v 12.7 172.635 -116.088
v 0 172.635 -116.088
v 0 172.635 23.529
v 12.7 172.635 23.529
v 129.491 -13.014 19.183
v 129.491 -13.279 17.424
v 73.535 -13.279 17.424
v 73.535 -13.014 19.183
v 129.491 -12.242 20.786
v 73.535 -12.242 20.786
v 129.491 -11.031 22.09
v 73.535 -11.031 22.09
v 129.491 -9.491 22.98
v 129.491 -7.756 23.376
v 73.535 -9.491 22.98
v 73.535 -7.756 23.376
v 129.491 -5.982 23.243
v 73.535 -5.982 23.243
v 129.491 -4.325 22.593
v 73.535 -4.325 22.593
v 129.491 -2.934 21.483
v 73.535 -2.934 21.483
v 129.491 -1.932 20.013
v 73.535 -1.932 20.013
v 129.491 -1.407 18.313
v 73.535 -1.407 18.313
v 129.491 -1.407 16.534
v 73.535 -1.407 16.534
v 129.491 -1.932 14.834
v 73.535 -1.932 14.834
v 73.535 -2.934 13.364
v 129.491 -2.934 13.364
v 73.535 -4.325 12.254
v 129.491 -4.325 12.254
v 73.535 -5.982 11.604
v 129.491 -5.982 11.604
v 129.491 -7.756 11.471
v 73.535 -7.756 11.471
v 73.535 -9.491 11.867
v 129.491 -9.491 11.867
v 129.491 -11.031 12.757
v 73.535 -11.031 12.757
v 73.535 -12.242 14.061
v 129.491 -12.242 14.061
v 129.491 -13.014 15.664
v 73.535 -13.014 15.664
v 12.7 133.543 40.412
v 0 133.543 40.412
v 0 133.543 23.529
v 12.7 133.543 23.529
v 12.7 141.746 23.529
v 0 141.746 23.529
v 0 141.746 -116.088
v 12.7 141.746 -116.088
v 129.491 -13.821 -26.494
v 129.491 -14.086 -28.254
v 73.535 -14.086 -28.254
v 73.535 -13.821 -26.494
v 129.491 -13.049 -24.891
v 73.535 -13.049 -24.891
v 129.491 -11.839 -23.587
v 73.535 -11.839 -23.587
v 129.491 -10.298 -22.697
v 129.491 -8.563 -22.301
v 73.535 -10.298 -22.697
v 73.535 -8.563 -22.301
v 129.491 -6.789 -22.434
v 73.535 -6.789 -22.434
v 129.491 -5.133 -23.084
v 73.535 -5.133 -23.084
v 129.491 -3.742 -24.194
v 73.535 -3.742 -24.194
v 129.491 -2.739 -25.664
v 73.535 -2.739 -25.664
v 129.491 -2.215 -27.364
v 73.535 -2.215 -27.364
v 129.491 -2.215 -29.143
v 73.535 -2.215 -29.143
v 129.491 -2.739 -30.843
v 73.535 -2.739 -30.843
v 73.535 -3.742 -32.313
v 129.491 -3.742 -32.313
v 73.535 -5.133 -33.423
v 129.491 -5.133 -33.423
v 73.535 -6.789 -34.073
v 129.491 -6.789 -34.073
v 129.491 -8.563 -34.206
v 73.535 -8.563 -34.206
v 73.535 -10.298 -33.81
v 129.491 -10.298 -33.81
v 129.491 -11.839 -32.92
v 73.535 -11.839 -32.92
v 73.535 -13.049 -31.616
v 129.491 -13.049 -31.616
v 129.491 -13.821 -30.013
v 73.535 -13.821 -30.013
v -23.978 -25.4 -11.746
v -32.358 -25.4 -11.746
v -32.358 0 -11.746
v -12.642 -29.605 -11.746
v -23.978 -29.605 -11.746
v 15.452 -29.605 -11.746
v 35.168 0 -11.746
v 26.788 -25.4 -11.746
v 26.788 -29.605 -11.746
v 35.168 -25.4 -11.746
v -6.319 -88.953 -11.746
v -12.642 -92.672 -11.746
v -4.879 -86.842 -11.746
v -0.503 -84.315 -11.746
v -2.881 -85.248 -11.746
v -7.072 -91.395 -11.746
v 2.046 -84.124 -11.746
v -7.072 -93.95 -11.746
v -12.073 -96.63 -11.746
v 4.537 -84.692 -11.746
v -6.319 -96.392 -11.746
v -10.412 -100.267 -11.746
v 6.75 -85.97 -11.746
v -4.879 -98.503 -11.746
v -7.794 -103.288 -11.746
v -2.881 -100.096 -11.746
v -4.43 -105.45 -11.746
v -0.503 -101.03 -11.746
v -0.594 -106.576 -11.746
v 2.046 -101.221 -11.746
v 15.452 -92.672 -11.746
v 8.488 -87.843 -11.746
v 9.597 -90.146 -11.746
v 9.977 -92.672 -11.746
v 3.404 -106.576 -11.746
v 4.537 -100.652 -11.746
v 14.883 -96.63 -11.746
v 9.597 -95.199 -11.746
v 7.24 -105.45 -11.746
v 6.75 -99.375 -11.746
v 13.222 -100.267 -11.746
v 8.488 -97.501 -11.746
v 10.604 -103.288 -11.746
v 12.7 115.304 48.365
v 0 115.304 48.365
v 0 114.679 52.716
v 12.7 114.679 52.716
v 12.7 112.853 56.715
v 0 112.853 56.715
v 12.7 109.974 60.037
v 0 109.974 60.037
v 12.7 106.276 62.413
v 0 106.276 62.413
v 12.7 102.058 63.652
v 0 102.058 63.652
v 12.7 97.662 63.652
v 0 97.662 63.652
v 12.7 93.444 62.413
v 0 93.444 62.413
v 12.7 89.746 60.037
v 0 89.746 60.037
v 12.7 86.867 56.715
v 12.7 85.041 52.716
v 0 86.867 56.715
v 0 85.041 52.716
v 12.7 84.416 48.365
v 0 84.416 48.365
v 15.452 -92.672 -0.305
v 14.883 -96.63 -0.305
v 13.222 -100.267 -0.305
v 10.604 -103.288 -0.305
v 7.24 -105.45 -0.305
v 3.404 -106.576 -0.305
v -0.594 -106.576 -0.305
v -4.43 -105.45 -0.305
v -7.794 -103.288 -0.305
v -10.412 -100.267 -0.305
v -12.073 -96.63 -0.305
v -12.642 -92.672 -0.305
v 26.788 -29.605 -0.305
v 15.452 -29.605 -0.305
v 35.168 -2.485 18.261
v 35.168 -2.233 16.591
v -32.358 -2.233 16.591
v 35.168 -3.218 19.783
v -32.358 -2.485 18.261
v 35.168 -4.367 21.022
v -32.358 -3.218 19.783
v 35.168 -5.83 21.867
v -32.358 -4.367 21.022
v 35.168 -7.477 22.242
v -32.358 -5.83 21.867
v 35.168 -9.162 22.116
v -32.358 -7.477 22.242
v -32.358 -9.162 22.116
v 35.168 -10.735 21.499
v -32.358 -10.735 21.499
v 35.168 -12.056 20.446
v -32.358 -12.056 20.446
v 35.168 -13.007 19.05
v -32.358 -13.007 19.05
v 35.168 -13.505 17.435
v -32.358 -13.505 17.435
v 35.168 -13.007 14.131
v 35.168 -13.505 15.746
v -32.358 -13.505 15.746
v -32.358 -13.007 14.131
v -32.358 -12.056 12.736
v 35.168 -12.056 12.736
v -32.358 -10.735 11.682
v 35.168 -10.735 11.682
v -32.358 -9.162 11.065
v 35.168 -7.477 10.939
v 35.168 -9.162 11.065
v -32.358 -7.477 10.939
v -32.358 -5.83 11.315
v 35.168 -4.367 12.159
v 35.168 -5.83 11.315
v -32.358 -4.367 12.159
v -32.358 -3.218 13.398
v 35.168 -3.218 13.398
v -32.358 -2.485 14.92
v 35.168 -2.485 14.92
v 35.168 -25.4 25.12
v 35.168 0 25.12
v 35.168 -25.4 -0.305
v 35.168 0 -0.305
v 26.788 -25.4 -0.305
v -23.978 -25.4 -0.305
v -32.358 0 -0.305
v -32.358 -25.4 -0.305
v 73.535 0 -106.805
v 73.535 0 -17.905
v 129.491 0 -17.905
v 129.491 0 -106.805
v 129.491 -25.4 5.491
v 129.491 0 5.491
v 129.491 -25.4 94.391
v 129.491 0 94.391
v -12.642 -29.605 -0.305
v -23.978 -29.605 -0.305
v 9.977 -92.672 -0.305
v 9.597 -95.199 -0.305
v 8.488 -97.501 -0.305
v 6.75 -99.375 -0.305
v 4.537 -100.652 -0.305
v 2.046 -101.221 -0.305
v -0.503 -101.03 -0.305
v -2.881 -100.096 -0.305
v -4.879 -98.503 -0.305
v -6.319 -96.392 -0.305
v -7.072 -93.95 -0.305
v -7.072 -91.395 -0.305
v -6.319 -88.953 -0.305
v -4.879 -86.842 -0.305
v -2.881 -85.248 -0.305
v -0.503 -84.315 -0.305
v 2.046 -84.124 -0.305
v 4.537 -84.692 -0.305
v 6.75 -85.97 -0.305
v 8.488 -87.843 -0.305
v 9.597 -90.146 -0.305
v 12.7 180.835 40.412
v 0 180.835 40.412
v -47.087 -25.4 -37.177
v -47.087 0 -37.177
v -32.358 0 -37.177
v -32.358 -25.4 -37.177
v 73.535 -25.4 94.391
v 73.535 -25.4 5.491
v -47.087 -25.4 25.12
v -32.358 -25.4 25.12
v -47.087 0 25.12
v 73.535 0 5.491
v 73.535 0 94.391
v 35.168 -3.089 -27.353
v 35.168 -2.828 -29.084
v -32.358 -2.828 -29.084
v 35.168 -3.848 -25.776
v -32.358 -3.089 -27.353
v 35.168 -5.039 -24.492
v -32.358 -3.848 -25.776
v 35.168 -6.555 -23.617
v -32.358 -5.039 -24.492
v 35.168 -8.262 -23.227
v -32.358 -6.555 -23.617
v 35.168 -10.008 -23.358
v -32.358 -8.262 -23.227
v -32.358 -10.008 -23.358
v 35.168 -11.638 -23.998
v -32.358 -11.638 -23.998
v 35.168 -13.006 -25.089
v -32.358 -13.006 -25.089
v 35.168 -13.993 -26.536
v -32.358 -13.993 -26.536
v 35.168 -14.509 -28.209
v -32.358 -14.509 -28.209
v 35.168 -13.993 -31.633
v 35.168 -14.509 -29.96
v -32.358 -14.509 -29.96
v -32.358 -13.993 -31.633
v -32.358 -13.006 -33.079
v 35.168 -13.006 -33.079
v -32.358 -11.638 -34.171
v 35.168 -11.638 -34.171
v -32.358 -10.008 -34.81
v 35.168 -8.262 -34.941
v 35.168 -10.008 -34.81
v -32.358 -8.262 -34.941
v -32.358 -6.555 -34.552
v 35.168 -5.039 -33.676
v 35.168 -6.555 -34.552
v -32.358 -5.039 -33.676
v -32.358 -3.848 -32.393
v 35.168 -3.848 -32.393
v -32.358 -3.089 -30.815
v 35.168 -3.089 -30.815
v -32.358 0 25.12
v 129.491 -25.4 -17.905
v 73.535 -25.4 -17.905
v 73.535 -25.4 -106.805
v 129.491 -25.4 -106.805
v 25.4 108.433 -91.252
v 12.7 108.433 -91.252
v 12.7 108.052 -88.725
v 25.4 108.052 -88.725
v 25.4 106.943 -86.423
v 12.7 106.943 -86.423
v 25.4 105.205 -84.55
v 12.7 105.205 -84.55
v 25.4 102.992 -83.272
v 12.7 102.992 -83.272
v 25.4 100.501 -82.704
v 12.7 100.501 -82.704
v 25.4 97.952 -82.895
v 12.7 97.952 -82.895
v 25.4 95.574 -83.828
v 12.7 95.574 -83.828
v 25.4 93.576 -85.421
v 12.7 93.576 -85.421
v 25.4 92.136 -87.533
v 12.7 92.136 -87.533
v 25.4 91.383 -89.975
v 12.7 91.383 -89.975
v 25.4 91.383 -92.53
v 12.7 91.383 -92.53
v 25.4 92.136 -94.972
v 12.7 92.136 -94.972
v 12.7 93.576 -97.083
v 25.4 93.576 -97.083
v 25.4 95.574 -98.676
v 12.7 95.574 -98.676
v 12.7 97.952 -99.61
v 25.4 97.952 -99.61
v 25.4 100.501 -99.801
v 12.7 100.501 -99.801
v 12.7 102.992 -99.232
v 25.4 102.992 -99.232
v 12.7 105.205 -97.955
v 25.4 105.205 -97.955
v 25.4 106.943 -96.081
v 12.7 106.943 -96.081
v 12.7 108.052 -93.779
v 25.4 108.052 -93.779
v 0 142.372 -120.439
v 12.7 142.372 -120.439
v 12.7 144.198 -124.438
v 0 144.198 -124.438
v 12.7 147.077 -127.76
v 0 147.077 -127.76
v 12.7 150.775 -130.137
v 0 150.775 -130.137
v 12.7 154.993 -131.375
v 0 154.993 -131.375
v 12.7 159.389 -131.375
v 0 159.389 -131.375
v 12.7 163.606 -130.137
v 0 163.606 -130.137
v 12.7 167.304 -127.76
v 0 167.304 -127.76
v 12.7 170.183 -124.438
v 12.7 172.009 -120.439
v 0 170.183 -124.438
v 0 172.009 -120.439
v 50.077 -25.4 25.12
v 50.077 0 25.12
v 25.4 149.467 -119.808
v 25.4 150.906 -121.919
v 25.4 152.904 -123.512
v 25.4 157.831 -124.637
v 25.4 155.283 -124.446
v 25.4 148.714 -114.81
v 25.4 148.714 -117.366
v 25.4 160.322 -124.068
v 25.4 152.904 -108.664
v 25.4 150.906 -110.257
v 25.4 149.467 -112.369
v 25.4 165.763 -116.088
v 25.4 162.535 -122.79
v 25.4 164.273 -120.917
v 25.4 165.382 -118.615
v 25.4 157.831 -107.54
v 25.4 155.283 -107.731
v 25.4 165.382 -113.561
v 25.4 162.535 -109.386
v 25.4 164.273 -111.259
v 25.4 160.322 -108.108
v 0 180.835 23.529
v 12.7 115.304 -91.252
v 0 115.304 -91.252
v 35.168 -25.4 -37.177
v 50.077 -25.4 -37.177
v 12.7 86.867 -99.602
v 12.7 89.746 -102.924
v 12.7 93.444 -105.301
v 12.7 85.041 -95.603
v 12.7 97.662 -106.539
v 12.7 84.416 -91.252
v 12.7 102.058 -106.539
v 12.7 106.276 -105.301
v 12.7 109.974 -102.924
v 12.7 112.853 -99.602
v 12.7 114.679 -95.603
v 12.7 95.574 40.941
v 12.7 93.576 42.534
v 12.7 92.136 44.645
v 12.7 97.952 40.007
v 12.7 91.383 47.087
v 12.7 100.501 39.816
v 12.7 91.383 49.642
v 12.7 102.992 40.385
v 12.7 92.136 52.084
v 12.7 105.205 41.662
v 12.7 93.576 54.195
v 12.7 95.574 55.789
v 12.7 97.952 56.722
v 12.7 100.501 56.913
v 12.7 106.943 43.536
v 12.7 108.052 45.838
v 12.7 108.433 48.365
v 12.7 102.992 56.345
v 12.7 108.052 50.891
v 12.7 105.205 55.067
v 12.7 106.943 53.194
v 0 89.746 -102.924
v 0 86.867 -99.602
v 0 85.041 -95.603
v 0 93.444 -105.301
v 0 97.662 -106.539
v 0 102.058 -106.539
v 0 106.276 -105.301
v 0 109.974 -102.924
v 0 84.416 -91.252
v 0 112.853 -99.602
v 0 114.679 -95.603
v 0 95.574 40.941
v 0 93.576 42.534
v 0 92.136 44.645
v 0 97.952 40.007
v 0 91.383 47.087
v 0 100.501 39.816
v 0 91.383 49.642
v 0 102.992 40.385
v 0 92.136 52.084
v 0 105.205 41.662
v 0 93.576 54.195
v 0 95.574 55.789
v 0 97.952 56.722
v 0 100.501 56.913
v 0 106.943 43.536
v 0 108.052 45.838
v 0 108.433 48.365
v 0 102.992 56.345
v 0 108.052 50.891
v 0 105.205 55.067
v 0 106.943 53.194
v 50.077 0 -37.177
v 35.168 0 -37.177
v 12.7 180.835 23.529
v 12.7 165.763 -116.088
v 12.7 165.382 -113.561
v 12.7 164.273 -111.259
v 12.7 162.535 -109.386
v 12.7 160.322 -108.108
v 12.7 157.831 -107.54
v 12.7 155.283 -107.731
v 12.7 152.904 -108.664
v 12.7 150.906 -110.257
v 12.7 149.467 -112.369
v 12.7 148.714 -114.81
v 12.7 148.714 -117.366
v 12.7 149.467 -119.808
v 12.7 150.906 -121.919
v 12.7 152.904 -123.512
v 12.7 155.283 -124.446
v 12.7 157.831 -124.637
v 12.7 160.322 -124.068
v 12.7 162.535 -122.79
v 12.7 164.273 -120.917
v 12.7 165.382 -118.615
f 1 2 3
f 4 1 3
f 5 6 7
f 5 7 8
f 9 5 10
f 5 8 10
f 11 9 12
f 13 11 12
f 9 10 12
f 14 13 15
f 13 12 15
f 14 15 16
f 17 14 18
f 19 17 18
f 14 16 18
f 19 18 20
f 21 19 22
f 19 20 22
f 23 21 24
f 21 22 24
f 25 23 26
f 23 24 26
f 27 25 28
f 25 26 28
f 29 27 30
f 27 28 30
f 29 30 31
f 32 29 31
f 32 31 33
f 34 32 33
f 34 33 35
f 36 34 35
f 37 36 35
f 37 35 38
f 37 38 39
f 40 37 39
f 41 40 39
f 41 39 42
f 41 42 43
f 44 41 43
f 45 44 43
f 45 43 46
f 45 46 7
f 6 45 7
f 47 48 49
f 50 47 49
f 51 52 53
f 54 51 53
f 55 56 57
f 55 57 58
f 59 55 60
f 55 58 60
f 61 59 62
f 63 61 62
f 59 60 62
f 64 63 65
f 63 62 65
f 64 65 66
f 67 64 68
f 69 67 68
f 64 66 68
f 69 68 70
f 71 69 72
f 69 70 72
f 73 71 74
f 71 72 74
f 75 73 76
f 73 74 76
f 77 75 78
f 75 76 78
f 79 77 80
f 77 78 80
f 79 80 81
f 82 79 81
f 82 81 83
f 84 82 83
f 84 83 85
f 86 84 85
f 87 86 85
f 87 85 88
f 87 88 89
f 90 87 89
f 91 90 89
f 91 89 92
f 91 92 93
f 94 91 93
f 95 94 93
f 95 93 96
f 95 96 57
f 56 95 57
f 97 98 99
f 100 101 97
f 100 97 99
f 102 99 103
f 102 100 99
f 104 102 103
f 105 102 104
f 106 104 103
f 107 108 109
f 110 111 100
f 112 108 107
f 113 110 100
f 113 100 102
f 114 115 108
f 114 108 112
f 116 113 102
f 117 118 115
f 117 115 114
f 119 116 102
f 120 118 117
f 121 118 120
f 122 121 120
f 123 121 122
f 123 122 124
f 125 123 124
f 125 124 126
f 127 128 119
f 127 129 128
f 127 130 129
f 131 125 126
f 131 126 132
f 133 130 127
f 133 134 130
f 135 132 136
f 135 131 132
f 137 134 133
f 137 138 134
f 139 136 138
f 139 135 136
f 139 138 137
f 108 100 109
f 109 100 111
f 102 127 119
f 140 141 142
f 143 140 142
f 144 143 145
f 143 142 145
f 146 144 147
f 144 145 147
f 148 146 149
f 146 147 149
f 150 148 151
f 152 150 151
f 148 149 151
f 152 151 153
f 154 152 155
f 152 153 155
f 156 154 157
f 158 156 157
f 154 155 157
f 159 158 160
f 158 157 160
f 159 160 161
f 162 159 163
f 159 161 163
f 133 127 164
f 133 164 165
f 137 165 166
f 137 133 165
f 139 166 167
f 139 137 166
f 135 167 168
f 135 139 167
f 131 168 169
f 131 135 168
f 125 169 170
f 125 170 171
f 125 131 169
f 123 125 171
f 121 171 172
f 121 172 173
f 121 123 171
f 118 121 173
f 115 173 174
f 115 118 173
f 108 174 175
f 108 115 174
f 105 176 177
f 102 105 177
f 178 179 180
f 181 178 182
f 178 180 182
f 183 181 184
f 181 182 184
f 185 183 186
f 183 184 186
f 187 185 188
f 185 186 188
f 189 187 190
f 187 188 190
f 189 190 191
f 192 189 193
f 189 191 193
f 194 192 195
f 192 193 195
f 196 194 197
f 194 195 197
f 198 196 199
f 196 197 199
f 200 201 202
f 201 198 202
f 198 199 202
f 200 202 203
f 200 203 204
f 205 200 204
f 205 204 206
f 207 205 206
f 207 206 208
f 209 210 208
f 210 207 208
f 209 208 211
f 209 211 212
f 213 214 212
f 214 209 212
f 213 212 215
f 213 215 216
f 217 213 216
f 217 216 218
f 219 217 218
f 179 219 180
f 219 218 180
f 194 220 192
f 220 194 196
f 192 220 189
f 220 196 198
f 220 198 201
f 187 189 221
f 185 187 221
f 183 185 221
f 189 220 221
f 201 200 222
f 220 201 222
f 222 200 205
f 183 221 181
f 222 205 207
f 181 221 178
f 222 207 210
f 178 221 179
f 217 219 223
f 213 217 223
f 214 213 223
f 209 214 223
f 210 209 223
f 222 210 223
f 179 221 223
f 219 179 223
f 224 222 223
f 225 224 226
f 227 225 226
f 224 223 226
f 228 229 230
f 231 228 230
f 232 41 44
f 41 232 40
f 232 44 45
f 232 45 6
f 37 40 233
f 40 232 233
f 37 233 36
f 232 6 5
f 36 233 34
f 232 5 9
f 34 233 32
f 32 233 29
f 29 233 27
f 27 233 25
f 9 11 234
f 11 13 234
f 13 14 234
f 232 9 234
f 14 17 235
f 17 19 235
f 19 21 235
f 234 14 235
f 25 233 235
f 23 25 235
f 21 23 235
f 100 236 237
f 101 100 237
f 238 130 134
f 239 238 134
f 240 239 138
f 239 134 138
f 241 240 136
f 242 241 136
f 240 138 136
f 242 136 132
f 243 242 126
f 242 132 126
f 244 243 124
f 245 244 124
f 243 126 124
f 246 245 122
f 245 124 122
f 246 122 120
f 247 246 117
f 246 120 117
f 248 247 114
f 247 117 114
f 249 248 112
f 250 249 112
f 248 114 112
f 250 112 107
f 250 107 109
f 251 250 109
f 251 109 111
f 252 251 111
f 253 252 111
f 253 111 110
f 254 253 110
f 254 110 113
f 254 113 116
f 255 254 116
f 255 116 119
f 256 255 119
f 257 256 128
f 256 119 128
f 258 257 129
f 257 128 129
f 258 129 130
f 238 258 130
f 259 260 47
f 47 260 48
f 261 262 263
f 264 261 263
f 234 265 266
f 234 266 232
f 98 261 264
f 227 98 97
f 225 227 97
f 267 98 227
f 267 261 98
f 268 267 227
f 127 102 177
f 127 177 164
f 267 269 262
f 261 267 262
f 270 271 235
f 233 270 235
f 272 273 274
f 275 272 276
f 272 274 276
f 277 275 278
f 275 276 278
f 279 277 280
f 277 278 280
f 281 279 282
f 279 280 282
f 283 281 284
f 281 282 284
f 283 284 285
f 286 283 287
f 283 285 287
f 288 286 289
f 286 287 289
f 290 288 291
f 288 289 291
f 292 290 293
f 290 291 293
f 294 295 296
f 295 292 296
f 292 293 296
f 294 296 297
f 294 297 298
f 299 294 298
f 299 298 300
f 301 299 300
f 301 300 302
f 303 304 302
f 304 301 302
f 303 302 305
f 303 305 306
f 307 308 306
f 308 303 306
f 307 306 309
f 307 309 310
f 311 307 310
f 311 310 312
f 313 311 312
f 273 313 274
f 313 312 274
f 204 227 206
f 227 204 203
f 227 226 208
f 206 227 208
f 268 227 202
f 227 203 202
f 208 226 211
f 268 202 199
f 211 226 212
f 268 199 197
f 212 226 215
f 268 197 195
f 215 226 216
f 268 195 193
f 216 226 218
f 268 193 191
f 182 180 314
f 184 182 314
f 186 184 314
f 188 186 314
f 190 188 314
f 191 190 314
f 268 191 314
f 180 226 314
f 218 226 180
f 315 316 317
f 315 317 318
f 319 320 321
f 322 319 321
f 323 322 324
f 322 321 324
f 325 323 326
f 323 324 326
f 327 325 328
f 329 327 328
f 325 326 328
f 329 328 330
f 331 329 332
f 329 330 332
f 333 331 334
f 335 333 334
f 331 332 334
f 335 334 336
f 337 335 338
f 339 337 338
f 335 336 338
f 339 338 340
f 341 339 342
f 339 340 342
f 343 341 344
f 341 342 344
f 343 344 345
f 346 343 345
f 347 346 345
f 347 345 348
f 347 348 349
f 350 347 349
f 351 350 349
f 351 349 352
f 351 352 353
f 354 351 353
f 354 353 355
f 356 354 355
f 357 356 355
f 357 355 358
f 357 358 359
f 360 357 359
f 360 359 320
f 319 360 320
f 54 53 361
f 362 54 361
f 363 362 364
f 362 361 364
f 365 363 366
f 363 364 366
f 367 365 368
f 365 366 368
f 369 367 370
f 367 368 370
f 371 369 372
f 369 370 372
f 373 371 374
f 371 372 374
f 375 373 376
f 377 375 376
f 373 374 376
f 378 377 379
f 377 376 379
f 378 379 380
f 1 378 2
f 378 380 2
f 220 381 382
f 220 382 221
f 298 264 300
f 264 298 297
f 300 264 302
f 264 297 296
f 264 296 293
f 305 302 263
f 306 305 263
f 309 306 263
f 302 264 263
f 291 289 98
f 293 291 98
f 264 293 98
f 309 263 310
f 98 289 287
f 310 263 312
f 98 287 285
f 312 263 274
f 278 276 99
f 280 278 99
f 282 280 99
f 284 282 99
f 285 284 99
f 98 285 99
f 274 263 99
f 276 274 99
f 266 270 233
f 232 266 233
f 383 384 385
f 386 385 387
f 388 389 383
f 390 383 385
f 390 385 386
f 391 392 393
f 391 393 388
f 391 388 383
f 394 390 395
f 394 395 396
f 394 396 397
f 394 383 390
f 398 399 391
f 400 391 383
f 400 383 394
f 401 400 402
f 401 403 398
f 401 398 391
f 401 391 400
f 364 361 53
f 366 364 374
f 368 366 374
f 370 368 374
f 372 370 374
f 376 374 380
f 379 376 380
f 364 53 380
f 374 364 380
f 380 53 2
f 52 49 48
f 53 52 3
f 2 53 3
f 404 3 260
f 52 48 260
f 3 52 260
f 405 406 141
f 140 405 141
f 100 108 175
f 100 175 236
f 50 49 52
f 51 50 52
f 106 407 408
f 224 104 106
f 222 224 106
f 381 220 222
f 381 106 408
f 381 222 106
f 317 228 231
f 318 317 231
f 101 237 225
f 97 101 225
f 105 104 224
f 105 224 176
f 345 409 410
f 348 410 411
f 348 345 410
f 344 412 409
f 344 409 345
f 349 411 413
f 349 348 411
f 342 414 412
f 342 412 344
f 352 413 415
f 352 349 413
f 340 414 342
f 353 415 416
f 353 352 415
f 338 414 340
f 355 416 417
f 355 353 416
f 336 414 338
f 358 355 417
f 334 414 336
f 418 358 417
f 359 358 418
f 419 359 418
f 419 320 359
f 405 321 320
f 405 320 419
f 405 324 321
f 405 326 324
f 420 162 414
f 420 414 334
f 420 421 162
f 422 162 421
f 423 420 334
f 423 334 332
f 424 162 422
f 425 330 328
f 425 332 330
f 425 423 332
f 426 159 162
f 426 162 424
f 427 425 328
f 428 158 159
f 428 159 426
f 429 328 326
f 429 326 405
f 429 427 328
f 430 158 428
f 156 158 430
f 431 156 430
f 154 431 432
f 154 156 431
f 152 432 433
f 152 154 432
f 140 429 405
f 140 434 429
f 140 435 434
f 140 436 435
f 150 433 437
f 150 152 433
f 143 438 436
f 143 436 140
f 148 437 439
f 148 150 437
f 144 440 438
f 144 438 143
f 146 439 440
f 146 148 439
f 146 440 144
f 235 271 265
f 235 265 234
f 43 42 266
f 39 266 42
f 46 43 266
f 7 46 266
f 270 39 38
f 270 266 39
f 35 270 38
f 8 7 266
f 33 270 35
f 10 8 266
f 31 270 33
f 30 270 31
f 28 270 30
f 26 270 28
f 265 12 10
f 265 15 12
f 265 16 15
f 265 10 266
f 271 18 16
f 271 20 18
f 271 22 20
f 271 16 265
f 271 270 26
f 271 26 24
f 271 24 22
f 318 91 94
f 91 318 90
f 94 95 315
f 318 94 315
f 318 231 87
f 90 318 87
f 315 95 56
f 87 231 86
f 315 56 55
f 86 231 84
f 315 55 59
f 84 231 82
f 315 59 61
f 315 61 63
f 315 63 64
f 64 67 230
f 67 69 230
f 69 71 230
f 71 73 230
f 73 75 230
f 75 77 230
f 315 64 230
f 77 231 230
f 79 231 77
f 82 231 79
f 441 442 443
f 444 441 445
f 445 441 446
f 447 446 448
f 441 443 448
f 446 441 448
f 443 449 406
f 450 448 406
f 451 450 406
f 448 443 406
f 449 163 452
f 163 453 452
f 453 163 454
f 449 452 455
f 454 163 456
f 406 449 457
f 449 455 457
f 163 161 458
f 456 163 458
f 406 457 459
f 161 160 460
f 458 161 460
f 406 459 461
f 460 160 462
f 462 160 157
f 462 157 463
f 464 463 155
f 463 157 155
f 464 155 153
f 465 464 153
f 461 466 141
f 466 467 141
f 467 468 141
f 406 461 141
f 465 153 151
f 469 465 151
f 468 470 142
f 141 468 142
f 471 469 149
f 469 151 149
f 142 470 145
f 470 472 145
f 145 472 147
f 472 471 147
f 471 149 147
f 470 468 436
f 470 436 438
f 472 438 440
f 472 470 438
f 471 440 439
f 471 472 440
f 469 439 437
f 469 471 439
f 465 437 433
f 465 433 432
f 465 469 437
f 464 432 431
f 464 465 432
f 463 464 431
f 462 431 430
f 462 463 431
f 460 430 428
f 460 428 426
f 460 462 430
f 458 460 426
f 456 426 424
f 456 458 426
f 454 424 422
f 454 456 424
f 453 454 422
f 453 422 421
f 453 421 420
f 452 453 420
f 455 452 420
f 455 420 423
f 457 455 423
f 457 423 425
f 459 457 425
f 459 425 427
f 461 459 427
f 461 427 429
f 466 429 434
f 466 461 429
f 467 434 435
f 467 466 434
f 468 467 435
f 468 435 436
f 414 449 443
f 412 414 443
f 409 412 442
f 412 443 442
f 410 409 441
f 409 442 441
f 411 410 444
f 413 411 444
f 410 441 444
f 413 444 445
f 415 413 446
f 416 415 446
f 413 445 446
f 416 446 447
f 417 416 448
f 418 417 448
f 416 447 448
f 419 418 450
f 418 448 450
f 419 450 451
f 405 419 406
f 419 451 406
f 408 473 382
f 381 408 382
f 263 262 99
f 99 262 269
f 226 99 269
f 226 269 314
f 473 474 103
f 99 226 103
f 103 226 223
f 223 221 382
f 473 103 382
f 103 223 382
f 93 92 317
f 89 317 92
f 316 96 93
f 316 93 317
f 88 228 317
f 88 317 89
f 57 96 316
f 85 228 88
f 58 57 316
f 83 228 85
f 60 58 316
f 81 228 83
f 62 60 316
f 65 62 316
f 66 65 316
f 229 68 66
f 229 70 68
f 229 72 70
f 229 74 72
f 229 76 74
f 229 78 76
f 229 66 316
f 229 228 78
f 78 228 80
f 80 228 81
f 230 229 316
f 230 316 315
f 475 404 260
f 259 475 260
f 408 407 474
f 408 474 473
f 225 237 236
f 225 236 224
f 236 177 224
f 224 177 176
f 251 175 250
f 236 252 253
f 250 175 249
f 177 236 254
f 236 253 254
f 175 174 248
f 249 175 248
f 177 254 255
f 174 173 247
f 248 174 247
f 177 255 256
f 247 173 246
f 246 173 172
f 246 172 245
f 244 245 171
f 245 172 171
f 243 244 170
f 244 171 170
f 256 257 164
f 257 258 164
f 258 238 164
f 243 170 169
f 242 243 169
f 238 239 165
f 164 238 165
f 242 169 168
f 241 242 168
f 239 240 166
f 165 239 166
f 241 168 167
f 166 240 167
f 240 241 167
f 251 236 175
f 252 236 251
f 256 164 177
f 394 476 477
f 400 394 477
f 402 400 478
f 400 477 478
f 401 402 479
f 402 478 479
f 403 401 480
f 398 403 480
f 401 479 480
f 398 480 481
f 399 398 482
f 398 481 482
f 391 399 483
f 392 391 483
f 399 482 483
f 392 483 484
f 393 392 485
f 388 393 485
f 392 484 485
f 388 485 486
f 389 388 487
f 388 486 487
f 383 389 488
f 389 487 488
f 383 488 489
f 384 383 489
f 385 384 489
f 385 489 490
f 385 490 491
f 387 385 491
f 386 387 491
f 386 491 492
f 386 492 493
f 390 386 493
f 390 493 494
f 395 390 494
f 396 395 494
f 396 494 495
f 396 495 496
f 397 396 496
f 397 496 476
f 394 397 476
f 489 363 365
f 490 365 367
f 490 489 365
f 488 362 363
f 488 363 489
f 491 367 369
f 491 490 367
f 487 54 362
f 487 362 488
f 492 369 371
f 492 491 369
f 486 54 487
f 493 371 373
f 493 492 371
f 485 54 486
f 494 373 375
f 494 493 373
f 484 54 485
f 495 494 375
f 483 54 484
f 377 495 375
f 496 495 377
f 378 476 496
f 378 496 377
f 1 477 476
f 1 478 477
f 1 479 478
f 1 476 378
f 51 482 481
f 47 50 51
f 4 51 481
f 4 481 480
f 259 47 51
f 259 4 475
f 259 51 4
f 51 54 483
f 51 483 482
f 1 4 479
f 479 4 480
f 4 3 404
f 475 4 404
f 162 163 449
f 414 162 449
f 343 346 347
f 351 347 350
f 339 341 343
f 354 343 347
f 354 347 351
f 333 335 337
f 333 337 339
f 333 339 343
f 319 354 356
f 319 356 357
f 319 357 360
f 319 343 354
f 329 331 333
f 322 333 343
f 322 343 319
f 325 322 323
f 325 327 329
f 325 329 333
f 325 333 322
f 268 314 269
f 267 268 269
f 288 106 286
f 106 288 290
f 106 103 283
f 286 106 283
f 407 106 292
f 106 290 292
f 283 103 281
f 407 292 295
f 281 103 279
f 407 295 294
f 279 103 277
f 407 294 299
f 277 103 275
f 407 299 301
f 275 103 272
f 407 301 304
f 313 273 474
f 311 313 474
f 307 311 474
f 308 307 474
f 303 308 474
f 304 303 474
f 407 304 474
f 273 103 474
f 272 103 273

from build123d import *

# Parameters (mm, degrees)
F1_DEPTH  = 25.4
F2_R      = 8.5725
F3_DEPTH  = 12.7
F4_DEPTH  = 25.4
F5_R      = 8.5725
F6_DEPTH  = 11.440287
F0_W      = 55.9562
F0_H      = 88.9
F7_DEPTH  = 25.4
F10_D     = 11.938
F10_DEPTH = 76.2
F8_R      = 5.667763
F8_R_2    = 5.87329
F11_DEPTH = 76.2


with BuildPart() as f1:
    # F0 (on Front) → F1 (new body)
    with BuildSketch(Plane.XZ):
        Polygon((-32.358131, 25.119715), (-47.087183, 25.119715), (-47.087183, -37.176999), (-32.358131, -37.176999), (-32.358131, -11.745678), (35.168068, -11.745678), (35.168068, -37.176999), (50.077325, -37.176999), (50.077325, 25.119715), (35.168068, 25.119715), (35.168068, -0.305422), (-32.358131, -0.305422), align=None)
    extrude(amount=F1_DEPTH)

    # F5 (on face) → F6 (join)
    with BuildSketch(Plane(origin=(0, 0, -11.745678), x_dir=(1, 0, 0), z_dir=(0, 0, -1))):
        with BuildLine():
            Line((-12.641885, 92.672303), (-12.641885, 29.604521))
            Line((-12.641885, 29.604521), (15.451822, 29.604521))
            Line((15.451822, 29.604521), (15.451822, 92.672303))
            ThreePointArc((15.451822, 92.672303), (1.404968, 106.719157), (-12.641885, 92.672303))
        make_face()
        with Locations((1.404968, 92.672303)):
            Circle(F5_R, mode=Mode.SUBTRACT)
        Polygon((-12.641885, 29.604521), (-23.97843, 29.604521), (-23.97843, 25.4), (26.788366, 25.4), (26.788366, 29.604521), (15.451822, 29.604521), align=None)
    extrude(amount=-F6_DEPTH)

    # F8 (on face) → F11 (join)
    with BuildSketch(Plane.YZ.offset(-32.358131)):
        with Locations((-7.90081, 16.590567)):
            Circle(F8_R)
        with Locations((-8.701051, -29.08426)):
            Circle(F8_R_2)
    extrude(amount=F11_DEPTH)


with BuildPart() as f3:
    # F2 (on Right) → F3 (new body)
    with BuildSketch(Plane.YZ):
        with BuildLine():
            ThreePointArc((115.30438, 48.36467), (99.860028, 63.809022), (84.415677, 48.36467))
            Line((84.415677, 48.36467), (84.415677, -91.252276))
            ThreePointArc((84.415677, -91.252276), (99.860028, -106.696627), (115.30438, -91.252276))
            Line((115.30438, -91.252276), (115.30438, 48.36467))
        make_face()
        with Locations((99.860028, -91.252276)):
            Circle(F2_R, mode=Mode.SUBTRACT)
        with Locations((99.860028, 48.36467)):
            Circle(F2_R, mode=Mode.SUBTRACT)
        with BuildLine():
            Line((157.190561, 23.528788), (141.746209, 23.528788))
            Line((141.746209, 23.528788), (141.746209, -116.088158))
            ThreePointArc((141.746209, -116.088158), (157.190561, -131.532509), (172.634913, -116.088158))
            Line((172.634913, -116.088158), (172.634913, 23.528788))
            Line((172.634913, 23.528788), (157.190561, 23.528788))
        make_face()
        with Locations((157.190561, -116.088158)):
            Circle(F2_R, mode=Mode.SUBTRACT)
        Polygon((133.543161, 23.528788), (141.746209, 23.528788), (157.190561, 23.528788), (172.634913, 23.528788), (180.835173, 23.528788), (180.835173, 40.411931), (157.190561, 40.411931), (133.543161, 40.411931), align=None)
    extrude(amount=F3_DEPTH)

    # F2 (on Right) → F4 (join)
    with BuildSketch(Plane.YZ):
        with Locations((99.860028, -91.252276)):
            Circle(F2_R)
        with Locations((157.190561, -116.088158)):
            Circle(F2_R)
    extrude(amount=F4_DEPTH)


with BuildPart() as f7:
    # F0 (on Front) → F7 (new body)
    with BuildSketch(Plane.XZ):
        with Locations((101.513058, -62.355198)):
            Rectangle(F0_W, F0_H)
        with Locations((101.513058, 49.941204)):
            Rectangle(F0_W, F0_H)
    extrude(amount=F7_DEPTH)

    # F10
    with Locations(Plane.YZ.offset(129.491158)):
        with Locations((-8.11729, -28.253516), (-7.309815, 17.423509)):
            Hole(F10_D / 2, depth=F10_DEPTH)


solid = Compound([f1.part, f3.part, f7.part])
